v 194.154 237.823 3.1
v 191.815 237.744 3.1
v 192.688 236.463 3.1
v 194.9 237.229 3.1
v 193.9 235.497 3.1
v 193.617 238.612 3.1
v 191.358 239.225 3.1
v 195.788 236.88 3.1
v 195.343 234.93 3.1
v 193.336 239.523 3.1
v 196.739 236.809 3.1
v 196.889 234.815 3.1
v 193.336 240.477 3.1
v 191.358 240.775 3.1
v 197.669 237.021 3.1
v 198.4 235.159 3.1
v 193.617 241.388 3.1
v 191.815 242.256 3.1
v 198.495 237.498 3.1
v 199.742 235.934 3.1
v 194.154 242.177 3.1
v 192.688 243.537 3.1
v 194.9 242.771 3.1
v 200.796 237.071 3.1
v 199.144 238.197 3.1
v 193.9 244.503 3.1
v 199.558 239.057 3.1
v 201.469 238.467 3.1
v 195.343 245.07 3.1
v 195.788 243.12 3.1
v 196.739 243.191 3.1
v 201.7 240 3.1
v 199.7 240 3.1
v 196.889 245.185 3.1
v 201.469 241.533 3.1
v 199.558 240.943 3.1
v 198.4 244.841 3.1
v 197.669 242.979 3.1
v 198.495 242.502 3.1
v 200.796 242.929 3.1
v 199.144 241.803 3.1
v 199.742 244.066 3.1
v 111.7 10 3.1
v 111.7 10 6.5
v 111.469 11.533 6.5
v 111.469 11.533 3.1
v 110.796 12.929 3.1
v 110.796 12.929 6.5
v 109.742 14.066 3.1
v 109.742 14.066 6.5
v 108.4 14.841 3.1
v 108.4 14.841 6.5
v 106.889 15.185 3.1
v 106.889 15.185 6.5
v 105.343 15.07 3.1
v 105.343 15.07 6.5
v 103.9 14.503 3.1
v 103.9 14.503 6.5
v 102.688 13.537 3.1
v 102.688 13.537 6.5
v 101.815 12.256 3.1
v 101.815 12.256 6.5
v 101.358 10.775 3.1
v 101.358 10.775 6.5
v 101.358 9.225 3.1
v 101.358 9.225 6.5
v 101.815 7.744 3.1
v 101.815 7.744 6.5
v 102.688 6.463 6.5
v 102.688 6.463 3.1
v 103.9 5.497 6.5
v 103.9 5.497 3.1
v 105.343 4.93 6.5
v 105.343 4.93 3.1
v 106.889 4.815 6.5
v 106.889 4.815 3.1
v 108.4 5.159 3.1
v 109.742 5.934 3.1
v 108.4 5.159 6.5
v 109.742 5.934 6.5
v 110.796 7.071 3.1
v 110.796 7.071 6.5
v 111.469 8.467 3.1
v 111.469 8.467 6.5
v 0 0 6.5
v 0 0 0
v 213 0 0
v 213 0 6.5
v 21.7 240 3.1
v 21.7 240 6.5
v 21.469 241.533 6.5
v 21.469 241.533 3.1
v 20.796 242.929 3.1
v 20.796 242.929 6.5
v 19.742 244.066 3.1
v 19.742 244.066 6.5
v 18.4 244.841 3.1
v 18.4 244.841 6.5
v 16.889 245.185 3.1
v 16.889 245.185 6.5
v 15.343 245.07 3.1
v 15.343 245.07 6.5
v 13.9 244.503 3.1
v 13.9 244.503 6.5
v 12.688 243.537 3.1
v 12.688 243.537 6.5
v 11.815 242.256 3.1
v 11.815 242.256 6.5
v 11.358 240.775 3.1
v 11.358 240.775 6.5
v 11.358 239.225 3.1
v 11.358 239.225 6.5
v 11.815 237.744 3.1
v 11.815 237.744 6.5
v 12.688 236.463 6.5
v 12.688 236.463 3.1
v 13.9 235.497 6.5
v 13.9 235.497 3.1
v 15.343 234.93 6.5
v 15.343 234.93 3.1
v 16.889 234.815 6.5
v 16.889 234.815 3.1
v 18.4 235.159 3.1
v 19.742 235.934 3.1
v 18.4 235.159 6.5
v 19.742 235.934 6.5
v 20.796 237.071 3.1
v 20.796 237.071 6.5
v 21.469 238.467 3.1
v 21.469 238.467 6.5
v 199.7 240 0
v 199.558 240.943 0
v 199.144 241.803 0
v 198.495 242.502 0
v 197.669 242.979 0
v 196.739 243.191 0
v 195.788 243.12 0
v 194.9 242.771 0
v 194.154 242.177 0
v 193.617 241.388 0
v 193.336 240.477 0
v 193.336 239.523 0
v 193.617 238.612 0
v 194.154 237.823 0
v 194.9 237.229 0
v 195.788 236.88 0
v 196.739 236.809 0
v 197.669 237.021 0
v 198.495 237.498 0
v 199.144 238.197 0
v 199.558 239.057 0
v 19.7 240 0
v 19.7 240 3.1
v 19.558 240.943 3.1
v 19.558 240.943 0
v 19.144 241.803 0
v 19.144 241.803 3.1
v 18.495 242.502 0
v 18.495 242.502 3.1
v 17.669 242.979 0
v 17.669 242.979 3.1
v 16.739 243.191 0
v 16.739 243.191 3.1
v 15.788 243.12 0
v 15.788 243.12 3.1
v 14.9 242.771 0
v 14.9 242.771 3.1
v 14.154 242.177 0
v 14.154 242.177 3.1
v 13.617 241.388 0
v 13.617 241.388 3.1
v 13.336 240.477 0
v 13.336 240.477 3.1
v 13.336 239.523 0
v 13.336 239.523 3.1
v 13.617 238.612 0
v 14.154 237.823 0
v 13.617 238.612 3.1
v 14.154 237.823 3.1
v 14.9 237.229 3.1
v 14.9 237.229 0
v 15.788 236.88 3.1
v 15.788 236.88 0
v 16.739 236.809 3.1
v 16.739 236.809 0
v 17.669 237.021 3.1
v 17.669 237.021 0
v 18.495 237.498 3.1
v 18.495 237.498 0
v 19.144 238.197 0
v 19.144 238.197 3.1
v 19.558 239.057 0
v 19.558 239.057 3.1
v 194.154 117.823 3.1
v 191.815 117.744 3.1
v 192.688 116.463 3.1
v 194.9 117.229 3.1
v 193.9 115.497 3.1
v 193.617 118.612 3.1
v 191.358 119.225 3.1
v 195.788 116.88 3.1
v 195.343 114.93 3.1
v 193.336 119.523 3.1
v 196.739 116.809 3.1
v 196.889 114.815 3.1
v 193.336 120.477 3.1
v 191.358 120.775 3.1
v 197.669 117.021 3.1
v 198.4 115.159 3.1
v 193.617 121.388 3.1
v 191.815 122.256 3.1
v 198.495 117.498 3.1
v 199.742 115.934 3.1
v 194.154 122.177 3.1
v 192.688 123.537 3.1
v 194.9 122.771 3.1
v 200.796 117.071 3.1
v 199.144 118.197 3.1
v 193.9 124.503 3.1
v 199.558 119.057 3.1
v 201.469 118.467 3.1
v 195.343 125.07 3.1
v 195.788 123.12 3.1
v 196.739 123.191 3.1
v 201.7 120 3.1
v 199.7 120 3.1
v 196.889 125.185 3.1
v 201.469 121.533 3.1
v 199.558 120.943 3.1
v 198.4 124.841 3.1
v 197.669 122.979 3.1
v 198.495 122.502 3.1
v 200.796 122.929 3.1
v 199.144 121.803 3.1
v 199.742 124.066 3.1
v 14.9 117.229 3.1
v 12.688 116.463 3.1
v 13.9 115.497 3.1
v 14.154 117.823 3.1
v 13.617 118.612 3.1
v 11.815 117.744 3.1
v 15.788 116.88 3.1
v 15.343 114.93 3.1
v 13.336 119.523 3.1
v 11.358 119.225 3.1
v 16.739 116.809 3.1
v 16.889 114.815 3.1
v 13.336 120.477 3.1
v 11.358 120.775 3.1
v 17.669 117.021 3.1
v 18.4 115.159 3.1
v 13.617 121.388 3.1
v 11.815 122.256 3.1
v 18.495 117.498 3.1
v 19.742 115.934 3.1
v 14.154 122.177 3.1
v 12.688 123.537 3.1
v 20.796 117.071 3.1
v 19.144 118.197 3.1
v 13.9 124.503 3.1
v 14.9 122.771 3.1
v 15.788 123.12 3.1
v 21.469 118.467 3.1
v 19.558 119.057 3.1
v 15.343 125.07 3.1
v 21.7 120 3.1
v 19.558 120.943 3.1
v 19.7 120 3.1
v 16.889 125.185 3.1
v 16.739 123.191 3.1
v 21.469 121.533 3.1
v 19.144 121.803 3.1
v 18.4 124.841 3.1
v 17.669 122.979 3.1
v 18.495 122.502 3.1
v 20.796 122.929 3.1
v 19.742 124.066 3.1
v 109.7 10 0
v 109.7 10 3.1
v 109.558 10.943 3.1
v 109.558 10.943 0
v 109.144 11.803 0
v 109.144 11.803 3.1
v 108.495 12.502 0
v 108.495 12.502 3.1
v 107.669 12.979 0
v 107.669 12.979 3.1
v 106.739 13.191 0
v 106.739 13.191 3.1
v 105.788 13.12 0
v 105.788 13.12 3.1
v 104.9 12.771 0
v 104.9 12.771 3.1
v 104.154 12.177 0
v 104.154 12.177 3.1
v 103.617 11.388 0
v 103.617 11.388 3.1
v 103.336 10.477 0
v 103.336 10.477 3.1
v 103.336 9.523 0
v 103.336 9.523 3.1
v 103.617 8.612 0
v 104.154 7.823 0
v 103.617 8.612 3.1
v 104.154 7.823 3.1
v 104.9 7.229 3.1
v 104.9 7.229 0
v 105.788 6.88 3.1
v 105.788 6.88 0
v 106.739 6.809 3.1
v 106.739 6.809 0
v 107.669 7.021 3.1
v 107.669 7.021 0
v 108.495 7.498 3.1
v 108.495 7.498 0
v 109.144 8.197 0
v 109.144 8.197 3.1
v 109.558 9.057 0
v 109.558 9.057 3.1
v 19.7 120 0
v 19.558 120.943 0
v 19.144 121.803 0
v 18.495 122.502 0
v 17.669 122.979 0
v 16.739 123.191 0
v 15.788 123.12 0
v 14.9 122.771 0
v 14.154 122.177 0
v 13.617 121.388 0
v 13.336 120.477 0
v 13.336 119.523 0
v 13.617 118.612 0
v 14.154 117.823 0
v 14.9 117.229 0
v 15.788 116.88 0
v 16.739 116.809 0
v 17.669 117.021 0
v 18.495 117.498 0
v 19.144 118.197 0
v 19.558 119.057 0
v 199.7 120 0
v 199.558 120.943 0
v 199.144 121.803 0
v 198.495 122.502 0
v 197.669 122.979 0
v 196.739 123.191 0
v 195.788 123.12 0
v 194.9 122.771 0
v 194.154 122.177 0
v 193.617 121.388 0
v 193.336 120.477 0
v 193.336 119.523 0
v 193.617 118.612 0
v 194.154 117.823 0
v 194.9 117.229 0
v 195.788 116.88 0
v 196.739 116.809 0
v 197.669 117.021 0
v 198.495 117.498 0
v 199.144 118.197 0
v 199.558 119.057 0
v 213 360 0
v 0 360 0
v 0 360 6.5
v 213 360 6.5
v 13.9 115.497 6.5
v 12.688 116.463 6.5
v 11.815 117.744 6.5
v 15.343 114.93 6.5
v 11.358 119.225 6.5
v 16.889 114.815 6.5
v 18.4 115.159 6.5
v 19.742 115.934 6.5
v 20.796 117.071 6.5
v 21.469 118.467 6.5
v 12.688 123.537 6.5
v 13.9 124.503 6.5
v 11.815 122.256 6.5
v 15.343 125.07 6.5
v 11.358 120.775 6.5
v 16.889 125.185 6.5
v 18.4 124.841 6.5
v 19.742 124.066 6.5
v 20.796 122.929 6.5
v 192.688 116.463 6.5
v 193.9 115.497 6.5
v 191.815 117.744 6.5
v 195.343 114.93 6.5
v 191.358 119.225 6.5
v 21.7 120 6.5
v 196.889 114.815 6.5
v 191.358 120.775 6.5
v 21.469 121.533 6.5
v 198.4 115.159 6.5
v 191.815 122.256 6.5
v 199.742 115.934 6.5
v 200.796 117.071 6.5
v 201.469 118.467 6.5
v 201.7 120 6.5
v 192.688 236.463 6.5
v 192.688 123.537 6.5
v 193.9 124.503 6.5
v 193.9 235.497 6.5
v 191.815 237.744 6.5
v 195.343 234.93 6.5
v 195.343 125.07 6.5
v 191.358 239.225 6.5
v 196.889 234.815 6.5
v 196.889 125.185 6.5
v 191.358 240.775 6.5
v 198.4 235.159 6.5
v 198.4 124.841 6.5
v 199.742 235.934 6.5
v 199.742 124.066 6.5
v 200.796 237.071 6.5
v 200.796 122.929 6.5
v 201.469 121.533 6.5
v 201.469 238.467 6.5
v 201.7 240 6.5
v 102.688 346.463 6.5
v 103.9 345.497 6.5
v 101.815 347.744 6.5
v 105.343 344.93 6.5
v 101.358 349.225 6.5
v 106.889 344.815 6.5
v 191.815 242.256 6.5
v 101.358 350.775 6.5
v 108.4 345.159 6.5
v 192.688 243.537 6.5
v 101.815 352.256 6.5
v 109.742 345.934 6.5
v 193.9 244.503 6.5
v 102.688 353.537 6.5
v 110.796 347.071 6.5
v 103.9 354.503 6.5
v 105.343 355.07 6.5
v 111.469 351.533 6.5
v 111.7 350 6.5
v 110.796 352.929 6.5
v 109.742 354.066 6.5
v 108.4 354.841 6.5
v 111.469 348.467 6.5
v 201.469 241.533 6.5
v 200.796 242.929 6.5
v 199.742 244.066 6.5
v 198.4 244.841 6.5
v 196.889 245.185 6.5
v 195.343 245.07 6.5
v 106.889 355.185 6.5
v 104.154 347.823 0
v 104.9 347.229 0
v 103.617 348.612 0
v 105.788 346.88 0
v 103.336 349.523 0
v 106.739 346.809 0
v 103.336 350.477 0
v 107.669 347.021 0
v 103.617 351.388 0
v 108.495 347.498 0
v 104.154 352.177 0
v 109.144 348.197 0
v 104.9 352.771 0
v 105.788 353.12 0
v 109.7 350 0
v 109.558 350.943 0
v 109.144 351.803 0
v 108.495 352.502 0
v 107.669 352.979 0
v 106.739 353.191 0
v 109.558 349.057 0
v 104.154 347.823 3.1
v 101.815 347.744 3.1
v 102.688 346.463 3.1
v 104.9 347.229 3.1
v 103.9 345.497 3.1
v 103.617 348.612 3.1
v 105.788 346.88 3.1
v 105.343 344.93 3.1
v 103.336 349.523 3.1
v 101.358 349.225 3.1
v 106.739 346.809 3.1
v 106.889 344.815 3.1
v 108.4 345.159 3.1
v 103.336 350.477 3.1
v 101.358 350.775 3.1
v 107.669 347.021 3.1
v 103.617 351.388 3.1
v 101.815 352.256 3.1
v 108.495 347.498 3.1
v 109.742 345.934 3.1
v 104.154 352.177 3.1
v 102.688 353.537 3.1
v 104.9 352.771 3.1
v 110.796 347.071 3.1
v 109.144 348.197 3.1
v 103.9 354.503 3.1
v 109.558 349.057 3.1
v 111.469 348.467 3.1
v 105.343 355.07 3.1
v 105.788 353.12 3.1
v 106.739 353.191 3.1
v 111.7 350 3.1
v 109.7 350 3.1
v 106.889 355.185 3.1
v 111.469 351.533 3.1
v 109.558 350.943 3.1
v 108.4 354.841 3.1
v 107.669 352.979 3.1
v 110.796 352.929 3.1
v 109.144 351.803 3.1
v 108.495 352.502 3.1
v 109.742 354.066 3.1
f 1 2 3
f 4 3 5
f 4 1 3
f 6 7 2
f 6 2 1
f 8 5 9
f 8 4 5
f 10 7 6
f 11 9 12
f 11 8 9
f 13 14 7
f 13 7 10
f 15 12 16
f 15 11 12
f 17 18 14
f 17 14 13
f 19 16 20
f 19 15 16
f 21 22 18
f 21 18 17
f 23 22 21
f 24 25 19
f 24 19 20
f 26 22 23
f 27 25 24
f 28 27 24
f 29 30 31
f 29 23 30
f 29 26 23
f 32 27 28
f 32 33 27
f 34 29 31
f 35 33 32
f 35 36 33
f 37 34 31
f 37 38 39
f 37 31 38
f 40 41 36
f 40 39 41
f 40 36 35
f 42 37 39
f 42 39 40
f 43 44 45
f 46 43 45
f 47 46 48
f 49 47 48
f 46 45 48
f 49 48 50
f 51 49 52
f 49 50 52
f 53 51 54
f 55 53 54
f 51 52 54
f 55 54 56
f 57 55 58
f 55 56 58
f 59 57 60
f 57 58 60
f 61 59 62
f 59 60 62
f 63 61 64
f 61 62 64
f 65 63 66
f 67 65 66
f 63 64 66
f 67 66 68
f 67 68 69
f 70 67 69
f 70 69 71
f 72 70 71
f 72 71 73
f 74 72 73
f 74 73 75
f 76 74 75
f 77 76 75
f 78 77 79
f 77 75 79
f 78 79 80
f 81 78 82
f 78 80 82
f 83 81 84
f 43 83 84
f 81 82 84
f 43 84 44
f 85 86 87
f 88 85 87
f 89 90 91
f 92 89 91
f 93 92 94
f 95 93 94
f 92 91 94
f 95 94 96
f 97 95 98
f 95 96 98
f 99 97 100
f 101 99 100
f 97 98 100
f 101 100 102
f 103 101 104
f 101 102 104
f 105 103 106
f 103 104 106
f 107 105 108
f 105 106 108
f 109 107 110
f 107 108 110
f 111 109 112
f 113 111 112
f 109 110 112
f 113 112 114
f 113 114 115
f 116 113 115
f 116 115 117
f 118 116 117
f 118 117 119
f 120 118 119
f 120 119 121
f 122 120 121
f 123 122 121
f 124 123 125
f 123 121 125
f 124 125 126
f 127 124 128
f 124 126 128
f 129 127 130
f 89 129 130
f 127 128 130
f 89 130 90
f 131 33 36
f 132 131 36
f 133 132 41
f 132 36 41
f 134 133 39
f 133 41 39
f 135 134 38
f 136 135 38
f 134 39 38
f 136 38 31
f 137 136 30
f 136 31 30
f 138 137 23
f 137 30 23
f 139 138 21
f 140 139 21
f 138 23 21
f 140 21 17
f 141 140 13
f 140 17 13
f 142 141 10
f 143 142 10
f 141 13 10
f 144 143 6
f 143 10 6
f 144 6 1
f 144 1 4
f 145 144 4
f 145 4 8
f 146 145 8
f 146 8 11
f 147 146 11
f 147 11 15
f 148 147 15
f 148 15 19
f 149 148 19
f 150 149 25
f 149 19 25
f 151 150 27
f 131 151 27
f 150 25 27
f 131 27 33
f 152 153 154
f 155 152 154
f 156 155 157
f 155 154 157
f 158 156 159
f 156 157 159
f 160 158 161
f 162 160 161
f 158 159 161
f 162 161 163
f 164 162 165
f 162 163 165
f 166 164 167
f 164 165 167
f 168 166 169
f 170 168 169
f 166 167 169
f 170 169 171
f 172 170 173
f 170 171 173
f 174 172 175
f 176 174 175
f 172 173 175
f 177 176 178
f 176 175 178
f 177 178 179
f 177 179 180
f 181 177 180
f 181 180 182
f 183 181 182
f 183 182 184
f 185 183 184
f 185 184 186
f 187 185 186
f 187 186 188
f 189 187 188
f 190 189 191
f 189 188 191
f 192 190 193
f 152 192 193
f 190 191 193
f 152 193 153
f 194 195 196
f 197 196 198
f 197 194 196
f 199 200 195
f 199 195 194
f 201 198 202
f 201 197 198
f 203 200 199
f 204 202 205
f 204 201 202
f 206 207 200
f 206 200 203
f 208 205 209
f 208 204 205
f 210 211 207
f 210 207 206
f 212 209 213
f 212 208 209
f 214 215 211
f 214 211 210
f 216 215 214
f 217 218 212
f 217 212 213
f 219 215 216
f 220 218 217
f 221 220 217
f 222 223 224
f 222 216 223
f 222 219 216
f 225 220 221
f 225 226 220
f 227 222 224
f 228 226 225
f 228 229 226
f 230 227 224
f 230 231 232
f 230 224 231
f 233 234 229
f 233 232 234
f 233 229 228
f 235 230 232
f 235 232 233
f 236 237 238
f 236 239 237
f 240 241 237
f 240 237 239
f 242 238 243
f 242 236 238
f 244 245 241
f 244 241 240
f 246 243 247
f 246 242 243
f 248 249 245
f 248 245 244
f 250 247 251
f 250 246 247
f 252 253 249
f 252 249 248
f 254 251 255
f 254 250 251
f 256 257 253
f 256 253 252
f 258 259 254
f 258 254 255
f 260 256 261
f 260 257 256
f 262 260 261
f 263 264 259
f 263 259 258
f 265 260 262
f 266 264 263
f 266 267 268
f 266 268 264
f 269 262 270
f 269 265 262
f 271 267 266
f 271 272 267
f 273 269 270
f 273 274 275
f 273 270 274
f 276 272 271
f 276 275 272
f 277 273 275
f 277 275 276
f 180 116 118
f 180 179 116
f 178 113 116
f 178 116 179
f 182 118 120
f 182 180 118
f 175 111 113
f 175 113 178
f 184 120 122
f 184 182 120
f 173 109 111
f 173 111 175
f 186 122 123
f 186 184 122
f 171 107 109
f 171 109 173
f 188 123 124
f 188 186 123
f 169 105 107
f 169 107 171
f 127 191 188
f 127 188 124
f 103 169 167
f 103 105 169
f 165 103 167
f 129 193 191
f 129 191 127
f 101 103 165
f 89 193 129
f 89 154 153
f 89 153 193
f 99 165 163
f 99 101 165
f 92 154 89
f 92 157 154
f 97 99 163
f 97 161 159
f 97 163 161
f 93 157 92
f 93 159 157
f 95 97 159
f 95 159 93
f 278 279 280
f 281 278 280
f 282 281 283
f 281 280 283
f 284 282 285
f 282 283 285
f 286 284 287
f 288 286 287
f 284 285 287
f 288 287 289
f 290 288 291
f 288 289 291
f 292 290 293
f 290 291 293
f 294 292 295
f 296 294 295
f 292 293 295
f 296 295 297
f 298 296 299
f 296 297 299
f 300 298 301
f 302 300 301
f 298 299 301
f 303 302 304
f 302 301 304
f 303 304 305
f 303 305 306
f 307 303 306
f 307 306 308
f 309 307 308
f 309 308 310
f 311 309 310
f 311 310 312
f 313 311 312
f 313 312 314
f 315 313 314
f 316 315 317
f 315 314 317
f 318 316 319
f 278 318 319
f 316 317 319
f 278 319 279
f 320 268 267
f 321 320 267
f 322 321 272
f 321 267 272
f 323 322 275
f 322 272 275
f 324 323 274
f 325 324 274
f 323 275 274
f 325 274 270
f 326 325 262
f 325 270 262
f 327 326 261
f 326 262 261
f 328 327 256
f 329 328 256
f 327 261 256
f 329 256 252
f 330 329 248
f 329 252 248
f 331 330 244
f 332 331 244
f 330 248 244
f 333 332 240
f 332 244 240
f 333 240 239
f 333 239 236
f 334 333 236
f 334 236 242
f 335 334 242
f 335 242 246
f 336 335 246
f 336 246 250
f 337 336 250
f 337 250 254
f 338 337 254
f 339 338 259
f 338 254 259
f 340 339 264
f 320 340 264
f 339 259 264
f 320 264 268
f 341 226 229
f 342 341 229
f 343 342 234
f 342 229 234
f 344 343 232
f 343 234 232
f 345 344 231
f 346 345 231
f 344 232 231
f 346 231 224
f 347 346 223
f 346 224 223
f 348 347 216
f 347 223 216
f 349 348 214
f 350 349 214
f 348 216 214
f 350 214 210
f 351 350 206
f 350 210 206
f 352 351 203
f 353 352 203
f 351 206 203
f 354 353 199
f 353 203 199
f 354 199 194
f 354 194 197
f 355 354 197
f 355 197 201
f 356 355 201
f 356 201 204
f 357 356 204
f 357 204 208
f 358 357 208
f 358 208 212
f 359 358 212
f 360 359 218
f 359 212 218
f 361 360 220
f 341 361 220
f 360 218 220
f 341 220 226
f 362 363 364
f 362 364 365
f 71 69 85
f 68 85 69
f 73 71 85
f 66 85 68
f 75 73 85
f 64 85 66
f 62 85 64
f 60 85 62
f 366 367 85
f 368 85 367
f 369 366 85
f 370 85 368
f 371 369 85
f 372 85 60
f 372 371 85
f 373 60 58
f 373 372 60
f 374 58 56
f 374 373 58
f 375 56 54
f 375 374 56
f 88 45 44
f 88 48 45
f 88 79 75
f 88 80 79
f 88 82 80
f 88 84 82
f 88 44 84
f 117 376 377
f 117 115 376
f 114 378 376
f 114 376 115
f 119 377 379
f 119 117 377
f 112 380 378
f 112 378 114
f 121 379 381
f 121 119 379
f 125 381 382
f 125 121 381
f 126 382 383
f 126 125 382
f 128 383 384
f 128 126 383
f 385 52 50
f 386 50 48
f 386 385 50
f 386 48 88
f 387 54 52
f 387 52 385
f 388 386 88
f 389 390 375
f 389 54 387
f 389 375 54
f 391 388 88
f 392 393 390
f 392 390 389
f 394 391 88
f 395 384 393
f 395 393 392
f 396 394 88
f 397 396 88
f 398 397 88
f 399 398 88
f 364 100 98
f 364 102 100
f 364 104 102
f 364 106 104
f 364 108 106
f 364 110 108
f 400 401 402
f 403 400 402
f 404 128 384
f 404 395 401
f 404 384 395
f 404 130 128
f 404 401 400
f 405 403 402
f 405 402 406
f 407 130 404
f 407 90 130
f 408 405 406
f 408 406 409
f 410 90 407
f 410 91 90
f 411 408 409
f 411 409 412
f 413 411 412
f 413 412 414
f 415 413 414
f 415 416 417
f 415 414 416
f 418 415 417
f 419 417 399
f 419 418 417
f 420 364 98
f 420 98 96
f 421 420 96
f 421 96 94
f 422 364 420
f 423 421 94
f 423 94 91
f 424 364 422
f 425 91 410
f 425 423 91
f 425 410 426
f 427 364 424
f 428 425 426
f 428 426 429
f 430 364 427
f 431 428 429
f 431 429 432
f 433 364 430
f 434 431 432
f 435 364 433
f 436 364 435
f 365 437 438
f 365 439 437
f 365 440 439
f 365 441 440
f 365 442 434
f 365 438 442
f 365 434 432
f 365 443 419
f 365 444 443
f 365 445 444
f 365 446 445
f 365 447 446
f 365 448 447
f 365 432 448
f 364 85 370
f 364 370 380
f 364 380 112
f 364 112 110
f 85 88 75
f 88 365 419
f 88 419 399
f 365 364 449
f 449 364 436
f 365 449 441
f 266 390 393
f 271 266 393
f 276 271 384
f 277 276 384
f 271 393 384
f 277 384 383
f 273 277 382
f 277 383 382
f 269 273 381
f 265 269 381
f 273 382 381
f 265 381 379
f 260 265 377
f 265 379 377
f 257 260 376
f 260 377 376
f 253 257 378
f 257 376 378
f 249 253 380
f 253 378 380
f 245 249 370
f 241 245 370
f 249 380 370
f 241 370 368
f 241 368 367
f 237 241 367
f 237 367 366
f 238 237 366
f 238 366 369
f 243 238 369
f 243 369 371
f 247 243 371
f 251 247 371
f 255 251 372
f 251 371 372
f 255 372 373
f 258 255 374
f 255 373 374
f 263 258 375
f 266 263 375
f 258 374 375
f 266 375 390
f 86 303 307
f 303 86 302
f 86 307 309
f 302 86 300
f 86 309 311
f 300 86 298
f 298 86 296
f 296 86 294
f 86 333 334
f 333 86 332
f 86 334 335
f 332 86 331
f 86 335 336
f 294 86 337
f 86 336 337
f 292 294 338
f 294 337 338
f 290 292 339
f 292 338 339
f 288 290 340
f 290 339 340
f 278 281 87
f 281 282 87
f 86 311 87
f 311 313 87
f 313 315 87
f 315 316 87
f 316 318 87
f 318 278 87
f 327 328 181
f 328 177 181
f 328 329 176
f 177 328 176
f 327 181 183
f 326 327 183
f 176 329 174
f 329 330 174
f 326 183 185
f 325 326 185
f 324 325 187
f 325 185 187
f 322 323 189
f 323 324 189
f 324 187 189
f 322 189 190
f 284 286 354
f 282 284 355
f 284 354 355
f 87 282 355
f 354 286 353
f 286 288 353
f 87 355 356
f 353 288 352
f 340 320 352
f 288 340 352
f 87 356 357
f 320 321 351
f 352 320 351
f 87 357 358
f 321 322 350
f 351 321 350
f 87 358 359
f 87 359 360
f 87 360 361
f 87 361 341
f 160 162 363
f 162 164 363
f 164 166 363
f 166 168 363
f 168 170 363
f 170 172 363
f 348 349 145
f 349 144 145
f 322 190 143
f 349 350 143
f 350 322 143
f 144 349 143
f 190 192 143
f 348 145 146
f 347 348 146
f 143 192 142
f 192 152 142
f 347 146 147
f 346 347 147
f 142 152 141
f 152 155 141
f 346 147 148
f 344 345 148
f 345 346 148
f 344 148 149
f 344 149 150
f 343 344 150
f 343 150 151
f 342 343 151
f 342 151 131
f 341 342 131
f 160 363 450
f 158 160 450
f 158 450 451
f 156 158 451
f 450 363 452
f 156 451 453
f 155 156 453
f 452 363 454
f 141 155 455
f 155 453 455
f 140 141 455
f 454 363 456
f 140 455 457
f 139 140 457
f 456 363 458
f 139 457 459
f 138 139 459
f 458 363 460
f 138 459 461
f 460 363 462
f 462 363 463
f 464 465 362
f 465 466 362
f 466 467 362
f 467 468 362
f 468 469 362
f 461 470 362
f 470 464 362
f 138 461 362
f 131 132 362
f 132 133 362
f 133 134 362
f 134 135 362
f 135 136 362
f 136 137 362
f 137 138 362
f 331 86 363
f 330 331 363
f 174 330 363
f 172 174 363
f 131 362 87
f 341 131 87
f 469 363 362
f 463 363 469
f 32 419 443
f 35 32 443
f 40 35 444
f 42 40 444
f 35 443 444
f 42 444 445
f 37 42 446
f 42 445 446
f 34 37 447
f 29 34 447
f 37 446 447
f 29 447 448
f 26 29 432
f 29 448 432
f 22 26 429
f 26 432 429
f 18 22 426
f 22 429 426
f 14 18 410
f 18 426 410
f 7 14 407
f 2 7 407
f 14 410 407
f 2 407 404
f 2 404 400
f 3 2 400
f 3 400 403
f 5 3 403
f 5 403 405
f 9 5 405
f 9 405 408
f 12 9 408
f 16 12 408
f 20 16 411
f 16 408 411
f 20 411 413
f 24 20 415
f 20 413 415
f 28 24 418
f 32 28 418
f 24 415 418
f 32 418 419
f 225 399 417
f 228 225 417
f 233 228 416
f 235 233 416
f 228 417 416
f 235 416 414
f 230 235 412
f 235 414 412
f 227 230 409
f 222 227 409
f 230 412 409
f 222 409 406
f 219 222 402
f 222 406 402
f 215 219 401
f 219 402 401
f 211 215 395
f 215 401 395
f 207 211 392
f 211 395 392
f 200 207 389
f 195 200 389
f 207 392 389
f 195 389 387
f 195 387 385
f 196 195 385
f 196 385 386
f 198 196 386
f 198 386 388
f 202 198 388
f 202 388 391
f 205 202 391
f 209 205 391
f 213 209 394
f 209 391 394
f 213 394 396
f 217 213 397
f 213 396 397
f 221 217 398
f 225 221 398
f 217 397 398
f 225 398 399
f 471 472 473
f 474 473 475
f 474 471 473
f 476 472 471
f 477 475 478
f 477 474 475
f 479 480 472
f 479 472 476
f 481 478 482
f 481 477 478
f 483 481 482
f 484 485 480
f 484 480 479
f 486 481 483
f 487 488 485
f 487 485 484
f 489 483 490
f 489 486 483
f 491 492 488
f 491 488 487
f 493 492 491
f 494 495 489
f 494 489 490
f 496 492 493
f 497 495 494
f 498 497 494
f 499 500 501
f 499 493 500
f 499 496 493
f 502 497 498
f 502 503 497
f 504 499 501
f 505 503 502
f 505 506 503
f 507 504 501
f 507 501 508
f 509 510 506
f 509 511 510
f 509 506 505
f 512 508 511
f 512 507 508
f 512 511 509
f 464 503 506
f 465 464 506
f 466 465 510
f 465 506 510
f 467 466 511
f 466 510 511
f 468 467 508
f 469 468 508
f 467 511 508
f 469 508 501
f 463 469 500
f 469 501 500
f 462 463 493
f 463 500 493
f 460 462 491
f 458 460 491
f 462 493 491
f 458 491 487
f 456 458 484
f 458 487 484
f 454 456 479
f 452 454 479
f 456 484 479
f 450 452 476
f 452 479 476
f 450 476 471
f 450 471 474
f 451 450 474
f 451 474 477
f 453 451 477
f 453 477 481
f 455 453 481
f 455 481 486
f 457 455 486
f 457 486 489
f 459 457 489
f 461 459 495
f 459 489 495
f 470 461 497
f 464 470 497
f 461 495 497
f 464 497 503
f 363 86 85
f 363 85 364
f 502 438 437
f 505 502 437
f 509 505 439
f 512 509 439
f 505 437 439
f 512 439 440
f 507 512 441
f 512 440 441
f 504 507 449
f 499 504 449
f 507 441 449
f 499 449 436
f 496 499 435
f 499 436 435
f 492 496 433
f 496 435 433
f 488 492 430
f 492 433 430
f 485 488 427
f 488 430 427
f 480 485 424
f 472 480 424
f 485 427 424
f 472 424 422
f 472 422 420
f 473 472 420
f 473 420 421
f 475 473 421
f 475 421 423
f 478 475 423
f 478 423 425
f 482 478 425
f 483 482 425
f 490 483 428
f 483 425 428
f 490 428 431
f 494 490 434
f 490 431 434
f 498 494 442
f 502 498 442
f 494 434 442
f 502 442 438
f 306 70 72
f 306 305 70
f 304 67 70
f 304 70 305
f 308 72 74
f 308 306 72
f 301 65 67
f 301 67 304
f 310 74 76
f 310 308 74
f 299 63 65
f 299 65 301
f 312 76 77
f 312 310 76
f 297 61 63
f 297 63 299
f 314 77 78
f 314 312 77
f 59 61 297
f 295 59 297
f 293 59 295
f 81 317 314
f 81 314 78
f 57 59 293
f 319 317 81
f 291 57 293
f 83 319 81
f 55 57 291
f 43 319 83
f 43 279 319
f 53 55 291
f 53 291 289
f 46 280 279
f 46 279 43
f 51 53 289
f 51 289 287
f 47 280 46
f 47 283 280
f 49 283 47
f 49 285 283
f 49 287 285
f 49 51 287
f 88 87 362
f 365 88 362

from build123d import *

# Parameters (mm, degrees)
SKETCH_W        = 213
SKETCH_H        = 360
PAD_DEPTH       = 6.5
SKETCH001_R     = 5.2
POCKET_DEPTH    = 3.4
SKETCH002_R     = 3.2
POCKET001_DEPTH = 3.1


with BuildPart() as part:
    # Sketch → Pad (new body)
    with BuildSketch(Plane.XY):
        with Locations((106.5, 180)):
            Rectangle(SKETCH_W, SKETCH_H)
    extrude(amount=PAD_DEPTH)

    # Sketch001 (on Face6 of Pad) → Pocket (cut)
    with BuildSketch(Plane.XY.offset(6.5)):
        with Locations((106.5, 350)):
            Circle(SKETCH001_R)
        with Locations((16.5, 240)):
            Circle(SKETCH001_R)
        with Locations((16.5, 120)):
            Circle(SKETCH001_R)
        with Locations((196.5, 240)):
            Circle(SKETCH001_R)
        with Locations((196.5, 120)):
            Circle(SKETCH001_R)
        with Locations((106.5, 10)):
            Circle(SKETCH001_R)
    extrude(amount=-POCKET_DEPTH, mode=Mode.SUBTRACT)

    # Sketch002 (on Face17 of Pocket) → Pocket001 (cut)
    with BuildSketch(Plane.XY.offset(3.1)):
        with Locations((106.5, 350)):
            Circle(SKETCH002_R)
        with Locations((16.5, 240)):
            Circle(SKETCH002_R)
        with Locations((16.5, 120)):
            Circle(SKETCH002_R)
        with Locations((196.5, 240)):
            Circle(SKETCH002_R)
        with Locations((196.5, 120)):
            Circle(SKETCH002_R)
        with Locations((106.5, 10)):
            Circle(SKETCH002_R)
    extrude(amount=-POCKET001_DEPTH, mode=Mode.SUBTRACT)


solid = part.part
